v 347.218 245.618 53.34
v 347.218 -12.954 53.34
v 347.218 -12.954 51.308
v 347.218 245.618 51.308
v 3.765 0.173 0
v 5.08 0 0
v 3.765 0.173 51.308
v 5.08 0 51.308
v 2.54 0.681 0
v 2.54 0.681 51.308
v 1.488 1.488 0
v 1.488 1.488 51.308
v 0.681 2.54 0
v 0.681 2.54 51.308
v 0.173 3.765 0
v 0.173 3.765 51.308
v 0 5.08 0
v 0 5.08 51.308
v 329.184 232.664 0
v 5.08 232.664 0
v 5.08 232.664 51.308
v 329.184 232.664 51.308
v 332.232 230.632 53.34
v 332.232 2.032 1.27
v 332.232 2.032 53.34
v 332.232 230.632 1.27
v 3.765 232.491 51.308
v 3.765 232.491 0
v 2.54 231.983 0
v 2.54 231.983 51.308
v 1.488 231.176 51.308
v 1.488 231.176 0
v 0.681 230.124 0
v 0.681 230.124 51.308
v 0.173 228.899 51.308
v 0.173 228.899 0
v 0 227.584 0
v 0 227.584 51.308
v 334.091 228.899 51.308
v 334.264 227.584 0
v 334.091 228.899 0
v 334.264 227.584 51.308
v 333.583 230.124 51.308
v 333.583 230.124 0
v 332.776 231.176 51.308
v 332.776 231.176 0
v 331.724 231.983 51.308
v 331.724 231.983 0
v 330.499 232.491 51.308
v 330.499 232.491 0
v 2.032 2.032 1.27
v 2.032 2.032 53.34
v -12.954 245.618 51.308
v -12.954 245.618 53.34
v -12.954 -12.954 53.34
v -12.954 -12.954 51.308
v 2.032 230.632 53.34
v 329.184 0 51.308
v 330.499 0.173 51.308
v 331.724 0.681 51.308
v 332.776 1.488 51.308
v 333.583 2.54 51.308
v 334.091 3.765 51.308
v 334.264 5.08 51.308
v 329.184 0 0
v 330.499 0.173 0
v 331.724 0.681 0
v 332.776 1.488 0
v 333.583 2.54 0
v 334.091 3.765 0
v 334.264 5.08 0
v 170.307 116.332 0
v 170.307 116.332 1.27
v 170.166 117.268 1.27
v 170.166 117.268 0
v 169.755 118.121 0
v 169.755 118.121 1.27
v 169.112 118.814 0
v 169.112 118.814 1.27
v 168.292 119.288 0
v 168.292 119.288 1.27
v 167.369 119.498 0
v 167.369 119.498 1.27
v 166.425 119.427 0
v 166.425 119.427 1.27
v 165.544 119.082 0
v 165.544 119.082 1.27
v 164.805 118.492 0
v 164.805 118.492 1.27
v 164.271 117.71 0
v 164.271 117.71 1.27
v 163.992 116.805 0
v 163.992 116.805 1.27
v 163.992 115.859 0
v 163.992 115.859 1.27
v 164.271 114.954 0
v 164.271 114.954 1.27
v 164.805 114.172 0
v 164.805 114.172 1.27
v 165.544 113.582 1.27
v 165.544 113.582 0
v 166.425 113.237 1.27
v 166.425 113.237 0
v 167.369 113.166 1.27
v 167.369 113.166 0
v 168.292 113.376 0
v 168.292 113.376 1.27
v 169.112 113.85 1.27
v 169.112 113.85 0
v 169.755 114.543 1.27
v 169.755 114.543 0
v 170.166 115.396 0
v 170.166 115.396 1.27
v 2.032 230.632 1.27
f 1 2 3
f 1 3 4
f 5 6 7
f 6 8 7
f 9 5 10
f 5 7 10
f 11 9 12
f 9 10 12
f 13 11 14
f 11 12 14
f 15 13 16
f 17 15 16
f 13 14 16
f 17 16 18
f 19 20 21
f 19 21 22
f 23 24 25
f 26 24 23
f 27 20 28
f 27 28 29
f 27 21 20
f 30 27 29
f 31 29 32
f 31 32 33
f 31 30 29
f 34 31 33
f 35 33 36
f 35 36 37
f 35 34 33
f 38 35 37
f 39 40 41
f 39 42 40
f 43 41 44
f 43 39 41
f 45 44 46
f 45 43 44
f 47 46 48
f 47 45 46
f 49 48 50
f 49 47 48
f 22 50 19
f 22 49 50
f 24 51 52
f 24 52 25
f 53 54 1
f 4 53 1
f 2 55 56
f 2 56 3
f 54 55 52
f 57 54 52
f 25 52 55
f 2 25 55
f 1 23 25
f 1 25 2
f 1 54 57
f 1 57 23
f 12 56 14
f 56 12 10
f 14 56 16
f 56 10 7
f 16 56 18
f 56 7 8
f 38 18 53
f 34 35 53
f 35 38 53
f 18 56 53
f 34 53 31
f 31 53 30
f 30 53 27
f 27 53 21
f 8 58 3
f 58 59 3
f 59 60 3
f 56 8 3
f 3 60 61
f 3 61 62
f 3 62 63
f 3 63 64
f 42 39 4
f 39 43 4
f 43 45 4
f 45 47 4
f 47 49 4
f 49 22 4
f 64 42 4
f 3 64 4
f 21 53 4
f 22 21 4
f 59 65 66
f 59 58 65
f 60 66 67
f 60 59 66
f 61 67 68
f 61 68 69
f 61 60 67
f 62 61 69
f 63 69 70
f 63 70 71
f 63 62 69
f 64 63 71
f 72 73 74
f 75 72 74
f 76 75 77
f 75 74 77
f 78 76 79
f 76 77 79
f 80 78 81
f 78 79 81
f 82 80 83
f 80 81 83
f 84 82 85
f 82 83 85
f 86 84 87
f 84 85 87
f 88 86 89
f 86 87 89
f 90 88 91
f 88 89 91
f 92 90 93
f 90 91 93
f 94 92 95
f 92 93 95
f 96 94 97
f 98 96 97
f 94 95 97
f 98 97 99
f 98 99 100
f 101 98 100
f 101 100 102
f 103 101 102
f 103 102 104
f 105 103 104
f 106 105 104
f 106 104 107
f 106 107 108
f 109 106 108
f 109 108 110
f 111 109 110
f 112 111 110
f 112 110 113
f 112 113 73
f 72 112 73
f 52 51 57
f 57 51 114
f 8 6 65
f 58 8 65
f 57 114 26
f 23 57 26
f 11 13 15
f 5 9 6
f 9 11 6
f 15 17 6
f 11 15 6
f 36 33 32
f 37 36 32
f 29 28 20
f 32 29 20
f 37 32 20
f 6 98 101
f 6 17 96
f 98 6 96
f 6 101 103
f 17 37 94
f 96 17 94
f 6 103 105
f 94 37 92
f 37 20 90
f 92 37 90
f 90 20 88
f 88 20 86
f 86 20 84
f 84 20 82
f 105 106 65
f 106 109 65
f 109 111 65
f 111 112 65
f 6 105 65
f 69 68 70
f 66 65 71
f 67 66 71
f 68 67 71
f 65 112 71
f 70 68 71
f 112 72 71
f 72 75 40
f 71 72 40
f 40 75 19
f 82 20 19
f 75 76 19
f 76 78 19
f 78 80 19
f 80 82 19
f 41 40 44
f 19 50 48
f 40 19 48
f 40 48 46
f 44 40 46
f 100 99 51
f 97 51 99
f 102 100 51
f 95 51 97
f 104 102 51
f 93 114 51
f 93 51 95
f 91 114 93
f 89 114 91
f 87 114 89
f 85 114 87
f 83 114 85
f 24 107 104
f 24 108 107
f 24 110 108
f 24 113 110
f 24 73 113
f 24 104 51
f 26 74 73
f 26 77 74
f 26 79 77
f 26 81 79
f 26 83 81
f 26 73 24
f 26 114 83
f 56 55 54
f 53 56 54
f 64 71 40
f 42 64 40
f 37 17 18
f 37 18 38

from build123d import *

# Parameters (mm, degrees)
F0_W     = 334.264
F0_H     = 232.664
F0_W_2   = 330.2
F0_H_2   = 228.6
F1_DEPTH = 53.34
F2_DEPTH = 1.27
F3_W     = 360.172
F3_H     = 258.572
F3_W_2   = 334.264
F3_H_2   = 232.664
F4_DEPTH = 2.032
F5_R     = 5.08
F6_R     = 3.175
F7_DEPTH = 1.271


with BuildPart() as f1:
    # F0 (on Top) → F1 (new body)
    with BuildSketch(Plane.XY):
        with Locations((167.132, 116.332)):
            Rectangle(F0_W, F0_H)
        with Locations((167.132, 116.332)):
            Rectangle(F0_W_2, F0_H_2, mode=Mode.SUBTRACT)
    extrude(amount=F1_DEPTH)

    # F0 (on Top) → F2 (join)
    with BuildSketch(Plane.XY):
        with Locations((167.132, 116.332)):
            Rectangle(F0_W_2, F0_H_2)
    extrude(amount=F2_DEPTH)

    # F3 (on face) → F4 (join)
    with BuildSketch(Plane.XY.offset(53.34)):
        with Locations((167.132, 116.332)):
            Rectangle(F3_W, F3_H)
        with Locations((167.132, 116.332)):
            Rectangle(F3_W_2, F3_H_2, mode=Mode.SUBTRACT)
    extrude(amount=-F4_DEPTH)

    # F5
    f5_edges = [f1.edges().sort_by_distance(p)[0] for p in [
        (334.264, 0, 25.654),
        (334.264, 232.664, 25.654),
        (0, 232.664, 25.654),
        (0, 0, 25.654),
    ]]
    fillet(f5_edges, radius=F5_R)

    # F6 (on face) → F7 (cut, through all)
    with BuildSketch(Plane.XY.offset(1.27)):
        with Locations((167.132, 116.332)):
            Circle(F6_R)
    extrude(amount=-F7_DEPTH, mode=Mode.SUBTRACT)


solid = f1.part
